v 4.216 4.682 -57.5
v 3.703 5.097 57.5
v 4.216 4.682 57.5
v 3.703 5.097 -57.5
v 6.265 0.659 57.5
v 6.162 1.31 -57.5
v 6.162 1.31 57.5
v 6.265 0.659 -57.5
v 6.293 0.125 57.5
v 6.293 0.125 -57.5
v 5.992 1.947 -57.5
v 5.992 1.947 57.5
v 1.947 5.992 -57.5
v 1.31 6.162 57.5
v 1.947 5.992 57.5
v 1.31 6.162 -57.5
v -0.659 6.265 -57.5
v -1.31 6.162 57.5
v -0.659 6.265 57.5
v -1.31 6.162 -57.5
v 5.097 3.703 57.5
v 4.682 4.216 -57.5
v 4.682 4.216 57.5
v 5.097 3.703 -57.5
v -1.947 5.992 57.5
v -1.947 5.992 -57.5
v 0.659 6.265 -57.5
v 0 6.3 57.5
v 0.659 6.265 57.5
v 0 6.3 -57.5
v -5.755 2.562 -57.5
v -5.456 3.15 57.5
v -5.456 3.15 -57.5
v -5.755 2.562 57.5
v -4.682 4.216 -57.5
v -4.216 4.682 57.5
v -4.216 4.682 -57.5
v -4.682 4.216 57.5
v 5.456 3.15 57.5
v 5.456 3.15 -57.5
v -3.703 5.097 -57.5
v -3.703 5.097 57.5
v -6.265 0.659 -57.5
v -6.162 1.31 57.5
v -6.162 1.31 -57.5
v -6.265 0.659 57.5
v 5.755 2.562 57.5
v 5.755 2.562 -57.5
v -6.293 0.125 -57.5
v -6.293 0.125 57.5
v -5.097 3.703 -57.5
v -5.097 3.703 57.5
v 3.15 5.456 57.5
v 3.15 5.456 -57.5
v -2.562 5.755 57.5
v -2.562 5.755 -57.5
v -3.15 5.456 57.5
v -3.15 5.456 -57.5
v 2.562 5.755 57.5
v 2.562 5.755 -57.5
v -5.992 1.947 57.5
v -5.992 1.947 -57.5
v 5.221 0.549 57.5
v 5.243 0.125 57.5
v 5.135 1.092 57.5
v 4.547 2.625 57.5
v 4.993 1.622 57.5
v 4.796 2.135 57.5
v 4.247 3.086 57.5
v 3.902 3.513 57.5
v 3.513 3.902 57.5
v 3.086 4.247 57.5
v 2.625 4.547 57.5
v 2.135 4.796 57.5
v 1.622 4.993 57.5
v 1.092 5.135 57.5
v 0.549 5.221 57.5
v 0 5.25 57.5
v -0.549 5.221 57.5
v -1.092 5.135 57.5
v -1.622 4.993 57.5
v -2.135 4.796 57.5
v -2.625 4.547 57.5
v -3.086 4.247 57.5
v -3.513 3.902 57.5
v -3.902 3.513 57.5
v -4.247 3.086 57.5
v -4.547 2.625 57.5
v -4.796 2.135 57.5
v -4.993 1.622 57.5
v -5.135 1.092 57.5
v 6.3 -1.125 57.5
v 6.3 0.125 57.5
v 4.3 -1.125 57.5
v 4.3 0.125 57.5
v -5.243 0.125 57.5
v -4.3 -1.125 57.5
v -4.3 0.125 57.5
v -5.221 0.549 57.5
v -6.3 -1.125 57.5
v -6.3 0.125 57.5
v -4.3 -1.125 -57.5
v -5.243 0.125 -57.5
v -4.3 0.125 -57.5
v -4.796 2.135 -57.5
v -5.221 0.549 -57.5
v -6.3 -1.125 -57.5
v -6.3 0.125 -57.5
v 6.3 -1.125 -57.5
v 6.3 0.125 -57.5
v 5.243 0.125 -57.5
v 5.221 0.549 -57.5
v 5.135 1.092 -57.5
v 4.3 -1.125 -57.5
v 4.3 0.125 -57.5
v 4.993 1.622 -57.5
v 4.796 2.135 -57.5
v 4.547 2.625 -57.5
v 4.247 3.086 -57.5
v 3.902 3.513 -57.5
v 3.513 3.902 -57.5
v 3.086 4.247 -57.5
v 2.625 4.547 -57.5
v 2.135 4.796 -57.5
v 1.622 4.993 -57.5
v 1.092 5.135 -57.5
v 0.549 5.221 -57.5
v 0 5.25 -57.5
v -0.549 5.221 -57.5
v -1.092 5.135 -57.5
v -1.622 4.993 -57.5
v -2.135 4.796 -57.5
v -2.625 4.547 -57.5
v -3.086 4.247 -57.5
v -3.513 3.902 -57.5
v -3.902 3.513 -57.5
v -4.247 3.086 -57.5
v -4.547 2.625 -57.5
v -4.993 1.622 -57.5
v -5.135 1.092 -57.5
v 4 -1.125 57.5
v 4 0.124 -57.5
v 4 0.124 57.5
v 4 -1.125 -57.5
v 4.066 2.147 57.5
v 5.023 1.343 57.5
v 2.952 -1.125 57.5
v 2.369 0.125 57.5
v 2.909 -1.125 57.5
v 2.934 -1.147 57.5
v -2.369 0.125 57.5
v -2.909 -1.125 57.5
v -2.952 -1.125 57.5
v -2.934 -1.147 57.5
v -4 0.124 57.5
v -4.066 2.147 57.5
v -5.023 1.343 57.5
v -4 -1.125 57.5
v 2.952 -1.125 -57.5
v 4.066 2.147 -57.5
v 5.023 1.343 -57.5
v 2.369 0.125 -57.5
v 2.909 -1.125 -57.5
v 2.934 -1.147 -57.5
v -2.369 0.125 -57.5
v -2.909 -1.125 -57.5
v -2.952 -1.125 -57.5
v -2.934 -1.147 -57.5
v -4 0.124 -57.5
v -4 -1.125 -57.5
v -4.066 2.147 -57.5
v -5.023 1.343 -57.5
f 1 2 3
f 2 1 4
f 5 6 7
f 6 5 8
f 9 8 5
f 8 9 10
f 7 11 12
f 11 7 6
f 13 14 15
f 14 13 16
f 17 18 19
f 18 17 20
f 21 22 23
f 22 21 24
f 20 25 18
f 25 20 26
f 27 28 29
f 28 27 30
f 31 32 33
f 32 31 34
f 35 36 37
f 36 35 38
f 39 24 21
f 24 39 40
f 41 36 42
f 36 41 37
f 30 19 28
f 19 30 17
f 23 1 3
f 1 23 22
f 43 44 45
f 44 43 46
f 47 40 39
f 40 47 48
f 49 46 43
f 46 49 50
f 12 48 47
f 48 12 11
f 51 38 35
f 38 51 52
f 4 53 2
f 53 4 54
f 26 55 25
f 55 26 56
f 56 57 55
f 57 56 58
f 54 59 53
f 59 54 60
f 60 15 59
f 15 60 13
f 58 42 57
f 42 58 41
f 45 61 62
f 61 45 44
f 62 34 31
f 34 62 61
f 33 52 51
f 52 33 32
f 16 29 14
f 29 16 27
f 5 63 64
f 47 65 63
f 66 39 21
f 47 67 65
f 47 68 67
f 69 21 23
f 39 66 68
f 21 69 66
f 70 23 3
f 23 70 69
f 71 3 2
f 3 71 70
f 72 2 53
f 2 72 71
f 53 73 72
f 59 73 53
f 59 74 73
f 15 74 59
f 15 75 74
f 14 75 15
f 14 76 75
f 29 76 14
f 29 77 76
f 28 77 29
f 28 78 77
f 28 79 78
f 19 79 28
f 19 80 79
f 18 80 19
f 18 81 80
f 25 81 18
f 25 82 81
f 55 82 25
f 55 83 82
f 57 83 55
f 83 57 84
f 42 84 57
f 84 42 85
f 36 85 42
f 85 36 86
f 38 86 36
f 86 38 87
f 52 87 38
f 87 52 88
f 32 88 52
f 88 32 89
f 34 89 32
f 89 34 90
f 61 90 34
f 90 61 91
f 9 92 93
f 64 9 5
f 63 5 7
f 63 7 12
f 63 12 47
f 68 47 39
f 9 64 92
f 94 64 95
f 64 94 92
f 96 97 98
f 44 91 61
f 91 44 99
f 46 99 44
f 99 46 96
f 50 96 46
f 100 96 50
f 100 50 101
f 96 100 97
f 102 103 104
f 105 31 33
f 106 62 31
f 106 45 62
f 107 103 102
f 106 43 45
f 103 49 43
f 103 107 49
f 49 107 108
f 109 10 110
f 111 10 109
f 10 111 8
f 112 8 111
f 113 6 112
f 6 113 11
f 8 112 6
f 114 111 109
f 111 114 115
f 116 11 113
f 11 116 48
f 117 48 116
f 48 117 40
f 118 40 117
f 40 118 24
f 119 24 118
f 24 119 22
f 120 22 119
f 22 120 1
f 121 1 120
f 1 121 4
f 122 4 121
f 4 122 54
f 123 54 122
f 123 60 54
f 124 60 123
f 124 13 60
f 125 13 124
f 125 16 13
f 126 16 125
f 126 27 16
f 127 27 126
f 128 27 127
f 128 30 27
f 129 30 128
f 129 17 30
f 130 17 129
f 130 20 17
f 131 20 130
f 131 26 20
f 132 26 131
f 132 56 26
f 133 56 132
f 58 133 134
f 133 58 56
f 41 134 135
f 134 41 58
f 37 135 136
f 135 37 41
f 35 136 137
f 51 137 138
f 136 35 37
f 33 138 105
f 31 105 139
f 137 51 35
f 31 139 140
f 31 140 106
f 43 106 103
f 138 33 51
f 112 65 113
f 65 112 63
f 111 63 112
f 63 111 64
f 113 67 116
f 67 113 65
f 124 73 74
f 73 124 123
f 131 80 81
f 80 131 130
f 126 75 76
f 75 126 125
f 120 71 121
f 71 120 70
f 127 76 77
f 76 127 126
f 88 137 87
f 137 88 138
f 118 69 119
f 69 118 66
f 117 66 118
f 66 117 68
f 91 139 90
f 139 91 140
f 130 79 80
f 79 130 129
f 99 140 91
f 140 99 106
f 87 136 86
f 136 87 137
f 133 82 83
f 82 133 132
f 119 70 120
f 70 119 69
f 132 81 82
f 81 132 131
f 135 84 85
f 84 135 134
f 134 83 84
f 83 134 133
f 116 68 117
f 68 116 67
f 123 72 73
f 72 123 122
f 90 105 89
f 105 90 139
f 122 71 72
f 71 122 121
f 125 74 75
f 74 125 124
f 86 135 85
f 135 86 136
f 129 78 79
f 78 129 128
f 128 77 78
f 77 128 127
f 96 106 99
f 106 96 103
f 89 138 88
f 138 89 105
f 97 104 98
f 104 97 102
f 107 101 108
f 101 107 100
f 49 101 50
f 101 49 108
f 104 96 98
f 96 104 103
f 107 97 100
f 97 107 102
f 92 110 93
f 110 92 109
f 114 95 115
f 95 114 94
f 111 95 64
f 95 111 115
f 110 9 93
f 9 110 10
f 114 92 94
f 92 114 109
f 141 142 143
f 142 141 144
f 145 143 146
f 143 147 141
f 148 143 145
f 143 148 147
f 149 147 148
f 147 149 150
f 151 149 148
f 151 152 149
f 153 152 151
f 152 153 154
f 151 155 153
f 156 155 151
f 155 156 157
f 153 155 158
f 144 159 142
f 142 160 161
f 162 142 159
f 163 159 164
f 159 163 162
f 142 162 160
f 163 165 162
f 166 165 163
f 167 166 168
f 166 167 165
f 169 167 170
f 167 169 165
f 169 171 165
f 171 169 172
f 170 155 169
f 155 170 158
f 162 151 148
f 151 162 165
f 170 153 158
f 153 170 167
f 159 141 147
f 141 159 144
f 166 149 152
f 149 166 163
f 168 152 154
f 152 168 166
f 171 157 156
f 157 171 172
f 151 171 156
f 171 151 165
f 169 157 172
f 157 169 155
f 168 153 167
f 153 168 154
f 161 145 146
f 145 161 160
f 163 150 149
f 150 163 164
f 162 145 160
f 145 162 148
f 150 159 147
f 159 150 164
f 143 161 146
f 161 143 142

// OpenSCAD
// MitLED -Ikea

/* [Einzelteile] */

// Cover
Cover = true;
// Ground
Ground = true;

/* [Konfiguration] */

$fn=60;

// Wandstärke
Wand = 2.1 ; 

module Cover() {
    aussen=10.5+Wand;
    innen=10.5;
    difference() {
        cylinder(d=aussen,h=115, center=true);
        cylinder(d=aussen-Wand,h=120,center=true);
        translate([0,-10,0])
        cube([20,20,120],center=true);
    }

    translate([-aussen/2+1,-0.5,0])
    cube([2,1.25,115],center=true);
    translate([aussen/2-1,-0.5,0])
    cube([2,1.25,115],center=true);
}


module Ground() {

    translate([0,-0.5,0])
    cube([8,1.25,115],center=true);
    
    translate([-3.5,0.5,0])
    rotate([0,0,-50])
    cube([3.25,1.25,115],center=true);
    
    translate([3.5,0.5,0])
    rotate([0,0,50])
    cube([3.25,1.25,115],center=true);
}


if (Cover)Cover();

if (Ground) Ground();
